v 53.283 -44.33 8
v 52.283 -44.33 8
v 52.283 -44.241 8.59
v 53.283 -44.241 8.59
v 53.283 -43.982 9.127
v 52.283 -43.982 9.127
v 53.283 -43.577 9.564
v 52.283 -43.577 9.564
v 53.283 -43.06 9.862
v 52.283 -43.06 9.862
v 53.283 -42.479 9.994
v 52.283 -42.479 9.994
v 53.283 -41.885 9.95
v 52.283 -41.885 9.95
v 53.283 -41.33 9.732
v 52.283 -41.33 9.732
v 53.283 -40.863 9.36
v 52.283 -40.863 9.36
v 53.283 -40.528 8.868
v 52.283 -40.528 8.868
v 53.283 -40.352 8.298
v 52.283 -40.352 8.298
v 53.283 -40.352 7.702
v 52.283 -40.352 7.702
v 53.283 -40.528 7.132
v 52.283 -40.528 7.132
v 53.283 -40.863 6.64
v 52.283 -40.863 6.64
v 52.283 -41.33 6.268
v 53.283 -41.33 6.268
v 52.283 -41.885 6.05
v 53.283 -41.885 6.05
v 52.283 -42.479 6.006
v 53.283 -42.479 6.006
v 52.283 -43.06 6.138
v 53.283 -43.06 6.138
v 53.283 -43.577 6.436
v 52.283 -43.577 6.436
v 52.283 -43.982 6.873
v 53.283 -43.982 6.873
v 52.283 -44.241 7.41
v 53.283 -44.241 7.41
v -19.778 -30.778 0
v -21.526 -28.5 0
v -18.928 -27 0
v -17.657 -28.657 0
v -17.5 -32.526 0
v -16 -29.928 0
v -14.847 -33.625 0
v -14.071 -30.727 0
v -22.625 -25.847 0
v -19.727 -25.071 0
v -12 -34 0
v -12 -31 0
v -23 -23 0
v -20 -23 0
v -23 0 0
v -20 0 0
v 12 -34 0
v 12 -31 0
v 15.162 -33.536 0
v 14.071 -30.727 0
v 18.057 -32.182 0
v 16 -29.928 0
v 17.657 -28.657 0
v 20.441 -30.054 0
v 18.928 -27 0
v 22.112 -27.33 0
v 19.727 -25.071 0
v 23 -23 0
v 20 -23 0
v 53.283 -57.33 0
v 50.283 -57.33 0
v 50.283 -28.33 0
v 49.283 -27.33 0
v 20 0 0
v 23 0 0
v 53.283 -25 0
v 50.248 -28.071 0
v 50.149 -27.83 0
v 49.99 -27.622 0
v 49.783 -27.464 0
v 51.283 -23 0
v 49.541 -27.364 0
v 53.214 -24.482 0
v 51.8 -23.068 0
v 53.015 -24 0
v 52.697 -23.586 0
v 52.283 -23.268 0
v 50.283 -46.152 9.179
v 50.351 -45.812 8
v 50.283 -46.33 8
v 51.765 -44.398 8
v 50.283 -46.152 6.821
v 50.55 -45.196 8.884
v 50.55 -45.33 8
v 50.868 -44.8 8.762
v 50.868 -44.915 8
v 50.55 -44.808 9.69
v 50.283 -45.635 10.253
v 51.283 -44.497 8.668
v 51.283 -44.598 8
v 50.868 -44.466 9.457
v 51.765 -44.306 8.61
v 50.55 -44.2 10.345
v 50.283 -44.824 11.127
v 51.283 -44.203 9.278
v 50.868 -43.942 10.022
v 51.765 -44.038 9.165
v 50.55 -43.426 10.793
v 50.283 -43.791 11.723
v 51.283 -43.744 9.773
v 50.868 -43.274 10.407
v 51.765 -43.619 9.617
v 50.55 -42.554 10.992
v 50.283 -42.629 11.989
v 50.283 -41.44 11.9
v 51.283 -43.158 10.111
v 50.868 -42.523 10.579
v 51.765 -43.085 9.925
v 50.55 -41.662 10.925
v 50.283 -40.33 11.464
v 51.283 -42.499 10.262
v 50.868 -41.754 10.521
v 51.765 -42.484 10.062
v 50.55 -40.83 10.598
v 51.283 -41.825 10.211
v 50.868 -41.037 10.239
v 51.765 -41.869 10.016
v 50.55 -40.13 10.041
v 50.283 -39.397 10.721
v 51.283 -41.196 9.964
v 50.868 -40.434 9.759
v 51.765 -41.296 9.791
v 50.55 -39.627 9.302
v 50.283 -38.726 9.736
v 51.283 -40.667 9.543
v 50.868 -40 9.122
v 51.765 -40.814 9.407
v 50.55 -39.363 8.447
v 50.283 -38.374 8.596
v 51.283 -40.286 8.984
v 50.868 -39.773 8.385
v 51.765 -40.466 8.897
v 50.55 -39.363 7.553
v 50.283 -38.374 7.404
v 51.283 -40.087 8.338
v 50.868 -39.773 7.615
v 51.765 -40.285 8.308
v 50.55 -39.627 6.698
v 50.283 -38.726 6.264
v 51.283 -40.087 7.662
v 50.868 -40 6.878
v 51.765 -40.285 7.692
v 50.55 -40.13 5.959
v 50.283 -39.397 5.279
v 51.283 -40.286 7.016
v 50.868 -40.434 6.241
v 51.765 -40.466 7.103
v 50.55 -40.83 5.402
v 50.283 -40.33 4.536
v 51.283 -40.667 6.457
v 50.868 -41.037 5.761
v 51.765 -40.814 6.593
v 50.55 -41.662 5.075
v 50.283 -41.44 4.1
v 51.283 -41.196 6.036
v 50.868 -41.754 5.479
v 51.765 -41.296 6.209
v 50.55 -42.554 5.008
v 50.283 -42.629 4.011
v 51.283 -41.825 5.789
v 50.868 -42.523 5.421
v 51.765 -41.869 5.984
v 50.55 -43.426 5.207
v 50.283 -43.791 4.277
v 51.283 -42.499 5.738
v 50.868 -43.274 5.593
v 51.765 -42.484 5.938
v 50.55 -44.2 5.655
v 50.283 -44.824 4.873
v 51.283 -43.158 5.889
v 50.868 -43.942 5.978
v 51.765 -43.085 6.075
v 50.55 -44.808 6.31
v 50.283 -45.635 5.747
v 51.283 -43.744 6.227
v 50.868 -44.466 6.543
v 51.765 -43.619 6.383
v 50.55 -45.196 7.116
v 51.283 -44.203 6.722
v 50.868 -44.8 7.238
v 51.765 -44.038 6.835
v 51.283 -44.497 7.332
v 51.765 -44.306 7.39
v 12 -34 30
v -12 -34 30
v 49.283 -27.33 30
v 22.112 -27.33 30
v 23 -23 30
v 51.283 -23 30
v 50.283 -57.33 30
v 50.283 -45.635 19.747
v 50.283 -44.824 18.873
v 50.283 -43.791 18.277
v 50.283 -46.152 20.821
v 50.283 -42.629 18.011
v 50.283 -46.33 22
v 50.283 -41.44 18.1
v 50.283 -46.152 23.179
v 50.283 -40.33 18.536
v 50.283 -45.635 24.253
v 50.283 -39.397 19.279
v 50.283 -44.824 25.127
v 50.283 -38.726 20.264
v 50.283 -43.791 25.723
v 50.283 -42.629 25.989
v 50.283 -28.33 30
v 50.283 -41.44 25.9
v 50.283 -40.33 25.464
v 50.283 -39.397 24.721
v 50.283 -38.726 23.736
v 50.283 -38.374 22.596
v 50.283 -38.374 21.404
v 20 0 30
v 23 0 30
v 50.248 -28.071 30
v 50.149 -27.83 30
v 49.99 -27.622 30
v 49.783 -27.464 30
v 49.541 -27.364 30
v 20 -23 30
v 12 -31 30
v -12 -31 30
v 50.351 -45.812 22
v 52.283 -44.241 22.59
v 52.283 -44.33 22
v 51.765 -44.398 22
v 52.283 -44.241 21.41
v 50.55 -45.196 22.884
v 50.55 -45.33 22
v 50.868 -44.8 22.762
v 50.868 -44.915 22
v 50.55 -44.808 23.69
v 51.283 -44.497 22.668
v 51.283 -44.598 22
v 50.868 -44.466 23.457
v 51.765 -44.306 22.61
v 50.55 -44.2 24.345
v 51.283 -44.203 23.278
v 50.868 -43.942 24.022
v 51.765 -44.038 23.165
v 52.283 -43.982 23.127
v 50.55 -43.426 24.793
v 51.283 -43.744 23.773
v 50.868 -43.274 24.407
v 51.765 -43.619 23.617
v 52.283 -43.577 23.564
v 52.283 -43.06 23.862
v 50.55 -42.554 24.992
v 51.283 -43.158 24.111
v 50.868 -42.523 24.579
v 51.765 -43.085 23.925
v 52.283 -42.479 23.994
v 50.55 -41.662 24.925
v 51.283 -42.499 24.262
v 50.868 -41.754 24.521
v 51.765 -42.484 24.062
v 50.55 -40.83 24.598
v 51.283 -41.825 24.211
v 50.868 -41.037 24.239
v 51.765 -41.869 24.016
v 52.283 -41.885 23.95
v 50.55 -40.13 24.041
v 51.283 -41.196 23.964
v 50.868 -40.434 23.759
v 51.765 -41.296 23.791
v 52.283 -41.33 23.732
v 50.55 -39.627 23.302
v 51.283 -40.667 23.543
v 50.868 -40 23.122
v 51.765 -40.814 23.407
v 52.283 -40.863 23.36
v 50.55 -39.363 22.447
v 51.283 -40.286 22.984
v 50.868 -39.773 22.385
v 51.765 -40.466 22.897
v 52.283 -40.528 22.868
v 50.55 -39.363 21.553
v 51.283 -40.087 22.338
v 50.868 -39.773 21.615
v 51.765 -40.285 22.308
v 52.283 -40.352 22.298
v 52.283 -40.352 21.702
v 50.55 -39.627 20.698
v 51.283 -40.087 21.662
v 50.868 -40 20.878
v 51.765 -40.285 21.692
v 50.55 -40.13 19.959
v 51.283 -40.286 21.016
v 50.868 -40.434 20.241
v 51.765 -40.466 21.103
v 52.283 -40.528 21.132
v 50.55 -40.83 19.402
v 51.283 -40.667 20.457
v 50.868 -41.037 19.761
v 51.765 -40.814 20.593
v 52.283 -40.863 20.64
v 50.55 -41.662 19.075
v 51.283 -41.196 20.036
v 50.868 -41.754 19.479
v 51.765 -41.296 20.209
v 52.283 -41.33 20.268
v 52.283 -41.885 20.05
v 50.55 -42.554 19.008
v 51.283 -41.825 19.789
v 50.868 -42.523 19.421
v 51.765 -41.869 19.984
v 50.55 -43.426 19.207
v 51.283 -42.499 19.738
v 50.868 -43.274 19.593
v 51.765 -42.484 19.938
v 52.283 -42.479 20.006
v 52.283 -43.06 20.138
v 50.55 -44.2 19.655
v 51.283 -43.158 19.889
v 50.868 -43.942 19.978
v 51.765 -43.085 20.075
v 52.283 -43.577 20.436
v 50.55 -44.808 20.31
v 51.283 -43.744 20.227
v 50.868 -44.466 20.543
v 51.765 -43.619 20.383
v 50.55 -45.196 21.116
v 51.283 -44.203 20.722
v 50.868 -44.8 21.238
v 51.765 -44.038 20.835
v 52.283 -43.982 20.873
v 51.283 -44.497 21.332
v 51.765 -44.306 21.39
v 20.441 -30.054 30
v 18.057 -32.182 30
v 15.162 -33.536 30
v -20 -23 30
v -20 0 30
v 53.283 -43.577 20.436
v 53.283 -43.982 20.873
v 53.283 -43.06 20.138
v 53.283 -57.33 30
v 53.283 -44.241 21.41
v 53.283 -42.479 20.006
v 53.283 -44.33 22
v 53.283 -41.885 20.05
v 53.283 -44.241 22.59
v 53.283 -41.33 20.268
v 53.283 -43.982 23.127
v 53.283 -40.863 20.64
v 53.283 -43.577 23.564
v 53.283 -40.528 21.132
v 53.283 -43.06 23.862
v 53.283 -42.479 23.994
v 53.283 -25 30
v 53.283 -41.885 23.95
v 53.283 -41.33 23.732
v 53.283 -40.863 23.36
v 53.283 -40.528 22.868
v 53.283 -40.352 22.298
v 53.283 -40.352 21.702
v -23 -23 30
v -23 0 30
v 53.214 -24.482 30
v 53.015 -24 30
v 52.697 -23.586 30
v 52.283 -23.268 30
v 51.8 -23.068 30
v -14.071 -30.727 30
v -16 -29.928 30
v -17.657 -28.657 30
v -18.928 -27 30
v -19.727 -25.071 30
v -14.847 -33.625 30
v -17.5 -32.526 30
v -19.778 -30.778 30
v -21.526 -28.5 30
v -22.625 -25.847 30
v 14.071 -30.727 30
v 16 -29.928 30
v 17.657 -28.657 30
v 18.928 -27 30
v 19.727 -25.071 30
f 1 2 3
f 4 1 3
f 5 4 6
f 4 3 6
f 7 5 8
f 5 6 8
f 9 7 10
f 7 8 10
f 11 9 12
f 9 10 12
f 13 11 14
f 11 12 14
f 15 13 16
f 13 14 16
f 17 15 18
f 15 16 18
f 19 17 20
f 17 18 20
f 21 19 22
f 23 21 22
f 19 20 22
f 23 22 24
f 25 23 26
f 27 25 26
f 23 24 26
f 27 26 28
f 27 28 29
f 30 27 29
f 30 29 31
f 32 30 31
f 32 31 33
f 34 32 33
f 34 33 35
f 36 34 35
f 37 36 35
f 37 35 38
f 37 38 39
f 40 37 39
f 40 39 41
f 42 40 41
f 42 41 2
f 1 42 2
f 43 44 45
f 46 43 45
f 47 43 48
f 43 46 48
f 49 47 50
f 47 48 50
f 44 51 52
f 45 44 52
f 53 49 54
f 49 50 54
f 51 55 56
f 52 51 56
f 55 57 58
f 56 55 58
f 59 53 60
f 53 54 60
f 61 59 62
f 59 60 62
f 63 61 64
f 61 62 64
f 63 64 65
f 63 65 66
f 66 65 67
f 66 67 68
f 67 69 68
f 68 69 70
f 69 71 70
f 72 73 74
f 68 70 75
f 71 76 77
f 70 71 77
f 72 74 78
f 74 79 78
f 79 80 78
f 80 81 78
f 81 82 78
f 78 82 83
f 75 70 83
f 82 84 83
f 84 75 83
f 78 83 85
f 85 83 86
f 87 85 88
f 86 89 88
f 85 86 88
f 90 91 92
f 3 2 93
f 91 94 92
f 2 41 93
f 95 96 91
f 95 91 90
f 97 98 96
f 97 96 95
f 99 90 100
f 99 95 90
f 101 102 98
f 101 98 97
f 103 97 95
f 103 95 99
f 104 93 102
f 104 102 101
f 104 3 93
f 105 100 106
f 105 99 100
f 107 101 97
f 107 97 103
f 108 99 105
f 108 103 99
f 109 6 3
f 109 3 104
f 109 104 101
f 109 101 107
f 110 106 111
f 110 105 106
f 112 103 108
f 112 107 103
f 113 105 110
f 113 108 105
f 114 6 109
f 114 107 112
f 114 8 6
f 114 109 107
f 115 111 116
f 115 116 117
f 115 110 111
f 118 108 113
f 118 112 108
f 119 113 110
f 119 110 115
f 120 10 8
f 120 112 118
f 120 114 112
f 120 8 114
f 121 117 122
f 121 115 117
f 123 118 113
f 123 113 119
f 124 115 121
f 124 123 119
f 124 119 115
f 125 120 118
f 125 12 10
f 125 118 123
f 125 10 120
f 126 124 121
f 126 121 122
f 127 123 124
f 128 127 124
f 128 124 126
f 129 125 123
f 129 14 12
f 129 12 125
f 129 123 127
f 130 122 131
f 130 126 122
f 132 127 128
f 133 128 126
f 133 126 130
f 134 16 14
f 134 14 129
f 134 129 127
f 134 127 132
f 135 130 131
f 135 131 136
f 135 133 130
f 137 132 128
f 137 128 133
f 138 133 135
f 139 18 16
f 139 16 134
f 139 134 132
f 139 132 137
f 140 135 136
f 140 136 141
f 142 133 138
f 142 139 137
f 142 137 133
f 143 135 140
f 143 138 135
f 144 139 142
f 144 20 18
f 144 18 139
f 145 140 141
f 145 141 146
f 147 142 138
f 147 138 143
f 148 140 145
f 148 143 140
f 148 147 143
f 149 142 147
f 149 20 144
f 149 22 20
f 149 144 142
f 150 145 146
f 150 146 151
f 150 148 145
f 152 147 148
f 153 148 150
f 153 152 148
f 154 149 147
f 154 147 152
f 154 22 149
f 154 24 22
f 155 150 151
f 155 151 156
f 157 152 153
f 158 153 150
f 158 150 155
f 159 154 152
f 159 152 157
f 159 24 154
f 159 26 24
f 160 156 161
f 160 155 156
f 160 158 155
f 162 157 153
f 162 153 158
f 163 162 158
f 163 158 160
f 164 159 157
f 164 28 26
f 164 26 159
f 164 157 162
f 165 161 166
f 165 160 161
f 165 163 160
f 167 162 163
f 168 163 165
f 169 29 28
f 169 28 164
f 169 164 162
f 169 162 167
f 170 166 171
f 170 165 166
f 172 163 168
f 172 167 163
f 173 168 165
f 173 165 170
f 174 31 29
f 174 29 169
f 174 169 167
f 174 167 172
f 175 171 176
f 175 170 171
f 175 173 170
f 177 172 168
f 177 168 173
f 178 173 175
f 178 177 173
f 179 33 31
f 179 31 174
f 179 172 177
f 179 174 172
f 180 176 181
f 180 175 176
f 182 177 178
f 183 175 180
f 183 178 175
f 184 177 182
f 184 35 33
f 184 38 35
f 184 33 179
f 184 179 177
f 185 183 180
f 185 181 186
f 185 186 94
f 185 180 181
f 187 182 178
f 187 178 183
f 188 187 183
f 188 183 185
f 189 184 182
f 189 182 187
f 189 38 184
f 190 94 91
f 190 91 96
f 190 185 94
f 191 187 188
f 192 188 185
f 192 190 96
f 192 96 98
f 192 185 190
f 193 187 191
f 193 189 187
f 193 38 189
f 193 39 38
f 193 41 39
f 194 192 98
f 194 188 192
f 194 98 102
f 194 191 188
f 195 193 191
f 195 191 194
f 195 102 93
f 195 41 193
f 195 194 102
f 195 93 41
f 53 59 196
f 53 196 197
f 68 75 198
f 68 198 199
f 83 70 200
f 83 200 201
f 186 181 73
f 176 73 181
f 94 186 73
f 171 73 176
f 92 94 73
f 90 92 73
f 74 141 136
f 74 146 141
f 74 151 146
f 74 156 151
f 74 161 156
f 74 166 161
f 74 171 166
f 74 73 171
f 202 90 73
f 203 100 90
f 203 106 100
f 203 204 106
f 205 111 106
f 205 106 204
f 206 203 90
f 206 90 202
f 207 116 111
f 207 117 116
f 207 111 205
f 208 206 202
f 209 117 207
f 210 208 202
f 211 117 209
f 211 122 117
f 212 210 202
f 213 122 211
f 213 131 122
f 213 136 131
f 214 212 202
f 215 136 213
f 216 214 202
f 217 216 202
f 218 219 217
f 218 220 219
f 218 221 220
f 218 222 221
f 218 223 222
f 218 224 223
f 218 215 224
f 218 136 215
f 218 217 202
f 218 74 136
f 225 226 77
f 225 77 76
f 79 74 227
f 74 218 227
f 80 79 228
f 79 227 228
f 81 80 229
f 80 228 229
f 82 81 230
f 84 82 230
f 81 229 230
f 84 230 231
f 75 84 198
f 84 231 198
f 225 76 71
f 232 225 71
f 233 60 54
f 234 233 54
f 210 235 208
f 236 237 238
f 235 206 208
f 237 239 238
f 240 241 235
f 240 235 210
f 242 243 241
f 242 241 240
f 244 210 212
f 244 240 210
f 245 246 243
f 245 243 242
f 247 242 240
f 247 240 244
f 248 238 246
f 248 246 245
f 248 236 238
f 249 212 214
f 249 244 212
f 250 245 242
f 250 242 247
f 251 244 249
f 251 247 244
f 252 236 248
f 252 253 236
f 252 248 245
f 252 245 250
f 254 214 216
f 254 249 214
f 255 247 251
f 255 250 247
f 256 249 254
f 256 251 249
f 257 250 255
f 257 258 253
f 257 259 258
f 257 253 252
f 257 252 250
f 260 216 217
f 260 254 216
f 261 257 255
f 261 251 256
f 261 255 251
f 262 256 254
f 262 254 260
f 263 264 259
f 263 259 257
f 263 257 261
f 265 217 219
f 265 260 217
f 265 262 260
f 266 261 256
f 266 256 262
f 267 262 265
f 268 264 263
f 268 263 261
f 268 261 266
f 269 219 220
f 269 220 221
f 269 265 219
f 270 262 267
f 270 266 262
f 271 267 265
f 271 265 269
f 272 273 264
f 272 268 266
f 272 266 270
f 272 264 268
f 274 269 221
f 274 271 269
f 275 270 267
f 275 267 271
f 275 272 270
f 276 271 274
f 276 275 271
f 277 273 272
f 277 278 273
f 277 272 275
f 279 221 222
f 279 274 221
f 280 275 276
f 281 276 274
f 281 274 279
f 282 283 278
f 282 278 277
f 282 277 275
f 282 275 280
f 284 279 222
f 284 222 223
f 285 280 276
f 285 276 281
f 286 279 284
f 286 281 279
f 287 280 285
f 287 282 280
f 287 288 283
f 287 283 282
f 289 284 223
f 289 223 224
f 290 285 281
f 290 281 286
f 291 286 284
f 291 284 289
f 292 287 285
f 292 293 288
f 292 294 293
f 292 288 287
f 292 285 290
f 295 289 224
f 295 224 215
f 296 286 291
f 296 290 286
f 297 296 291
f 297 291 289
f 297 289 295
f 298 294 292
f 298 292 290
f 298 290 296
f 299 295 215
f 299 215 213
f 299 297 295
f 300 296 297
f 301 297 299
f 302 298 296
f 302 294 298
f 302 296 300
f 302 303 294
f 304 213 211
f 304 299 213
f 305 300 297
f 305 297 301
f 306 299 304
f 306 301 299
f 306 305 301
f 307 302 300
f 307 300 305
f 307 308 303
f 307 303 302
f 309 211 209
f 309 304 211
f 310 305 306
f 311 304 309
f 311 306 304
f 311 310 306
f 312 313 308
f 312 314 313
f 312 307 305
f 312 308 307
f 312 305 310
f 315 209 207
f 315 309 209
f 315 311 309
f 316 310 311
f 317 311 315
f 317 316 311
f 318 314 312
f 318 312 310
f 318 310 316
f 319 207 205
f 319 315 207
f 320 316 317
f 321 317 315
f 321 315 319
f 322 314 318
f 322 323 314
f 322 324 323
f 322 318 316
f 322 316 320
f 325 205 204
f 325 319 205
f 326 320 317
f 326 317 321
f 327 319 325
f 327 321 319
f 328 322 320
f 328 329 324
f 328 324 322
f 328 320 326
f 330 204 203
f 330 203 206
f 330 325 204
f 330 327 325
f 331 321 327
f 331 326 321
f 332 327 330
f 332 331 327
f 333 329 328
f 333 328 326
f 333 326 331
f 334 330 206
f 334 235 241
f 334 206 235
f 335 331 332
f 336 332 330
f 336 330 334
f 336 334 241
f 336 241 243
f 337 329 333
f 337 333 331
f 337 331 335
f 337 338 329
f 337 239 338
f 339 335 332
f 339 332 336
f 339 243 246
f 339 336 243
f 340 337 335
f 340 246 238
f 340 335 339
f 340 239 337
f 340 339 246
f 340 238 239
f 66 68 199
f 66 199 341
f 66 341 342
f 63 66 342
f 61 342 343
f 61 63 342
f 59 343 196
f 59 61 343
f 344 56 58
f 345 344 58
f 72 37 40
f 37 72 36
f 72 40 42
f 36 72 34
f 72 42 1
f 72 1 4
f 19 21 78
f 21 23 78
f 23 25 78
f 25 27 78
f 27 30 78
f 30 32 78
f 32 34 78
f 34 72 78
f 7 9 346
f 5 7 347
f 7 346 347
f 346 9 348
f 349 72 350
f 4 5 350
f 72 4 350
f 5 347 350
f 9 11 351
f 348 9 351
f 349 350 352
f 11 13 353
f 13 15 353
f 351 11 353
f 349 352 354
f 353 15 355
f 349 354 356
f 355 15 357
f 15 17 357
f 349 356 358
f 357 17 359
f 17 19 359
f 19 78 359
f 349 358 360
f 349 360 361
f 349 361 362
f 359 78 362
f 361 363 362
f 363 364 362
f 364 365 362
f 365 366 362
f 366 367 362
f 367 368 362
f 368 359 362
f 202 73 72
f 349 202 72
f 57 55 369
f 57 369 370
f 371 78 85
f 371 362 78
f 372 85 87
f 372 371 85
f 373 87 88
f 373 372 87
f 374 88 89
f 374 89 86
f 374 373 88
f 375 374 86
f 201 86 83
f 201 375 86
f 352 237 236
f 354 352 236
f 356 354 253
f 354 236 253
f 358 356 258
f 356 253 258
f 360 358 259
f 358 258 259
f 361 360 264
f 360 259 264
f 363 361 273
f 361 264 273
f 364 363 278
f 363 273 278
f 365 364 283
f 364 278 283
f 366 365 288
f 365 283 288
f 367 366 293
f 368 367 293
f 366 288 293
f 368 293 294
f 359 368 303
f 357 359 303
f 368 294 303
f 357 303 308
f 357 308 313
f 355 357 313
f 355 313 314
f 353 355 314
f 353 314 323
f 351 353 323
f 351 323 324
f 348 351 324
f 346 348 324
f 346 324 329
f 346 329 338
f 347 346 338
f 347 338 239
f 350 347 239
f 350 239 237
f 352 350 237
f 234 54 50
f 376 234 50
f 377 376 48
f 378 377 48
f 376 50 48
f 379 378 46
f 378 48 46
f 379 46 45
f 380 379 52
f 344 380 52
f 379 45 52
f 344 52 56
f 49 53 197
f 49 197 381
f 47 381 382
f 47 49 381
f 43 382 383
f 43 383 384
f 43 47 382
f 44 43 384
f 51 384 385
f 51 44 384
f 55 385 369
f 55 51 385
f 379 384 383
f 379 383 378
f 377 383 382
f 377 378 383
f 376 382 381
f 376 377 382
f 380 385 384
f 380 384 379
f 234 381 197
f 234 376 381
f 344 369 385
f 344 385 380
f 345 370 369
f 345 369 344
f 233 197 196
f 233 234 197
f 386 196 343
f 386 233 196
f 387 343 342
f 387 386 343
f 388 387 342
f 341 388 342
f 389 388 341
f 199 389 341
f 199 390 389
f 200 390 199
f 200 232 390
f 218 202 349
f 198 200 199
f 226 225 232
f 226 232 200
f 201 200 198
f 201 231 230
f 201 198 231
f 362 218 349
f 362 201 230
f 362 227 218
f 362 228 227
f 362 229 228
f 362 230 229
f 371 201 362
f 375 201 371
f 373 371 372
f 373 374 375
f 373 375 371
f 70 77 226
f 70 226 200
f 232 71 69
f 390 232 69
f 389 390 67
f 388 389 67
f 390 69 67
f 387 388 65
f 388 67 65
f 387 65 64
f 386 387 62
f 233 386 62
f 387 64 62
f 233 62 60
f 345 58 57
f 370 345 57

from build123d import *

# Parameters (mm, degrees)
BOSS_EXTRUDE1_DEPTH = 30
BOSS_EXTRUDE2_DEPTH = 30
SKETCH3_W           = 3
SKETCH3_H           = 30
BOSS_EXTRUDE3_DEPTH = 30
FILLET1_R           = 1
FILLET2_R           = 2
SKETCH4_R           = 2
CUT_EXTRUDE1_DEPTH  = 30
FILLET3_R           = 2
SKETCH6_W           = 80.718838425
SKETCH6_H           = 35.980410733
CUT_EXTRUDE2_DEPTH  = 84.819501439


with BuildPart() as part:
    # Sketch1 → Boss-Extrude1 (new body)
    with BuildSketch(Plane.XY):
        with BuildLine():
            Line((-12, 34), (12, 34))
            ThreePointArc((12, 34), (19.778174593, 30.778174593), (23, 23))
            Line((23, 23), (23, -23))
            ThreePointArc((23, -23), (19.778174593, -30.778174593), (12, -34))
            Line((12, -34), (-12, -34))
            ThreePointArc((-12, -34), (-19.778174593, -30.778174593), (-23, -23))
            Line((-23, -23), (-23, 23))
            ThreePointArc((-23, 23), (-19.778174593, 30.778174593), (-12, 34))
        make_face()
        with BuildLine():
            Line((-12, 31), (12, 31))
            ThreePointArc((12, 31), (17.656854249, 28.656854249), (20, 23))
            Line((20, 23), (20, -23))
            ThreePointArc((20, -23), (17.656854249, -28.656854249), (12, -31))
            Line((12, -31), (-12, -31))
            ThreePointArc((-12, -31), (-17.656854249, -28.656854249), (-20, -23))
            Line((-20, -23), (-20, 23))
            ThreePointArc((-20, 23), (-17.656854249, 28.656854249), (-12, 31))
        make_face(mode=Mode.SUBTRACT)
    extrude(amount=BOSS_EXTRUDE1_DEPTH)

    # Sketch2 → Boss-Extrude2 (add)
    with BuildSketch(Plane.XY):
        with BuildLine():
            Line((23, -23), (53.282521301, -23))
            Line((53.282521301, -23), (53.282521301, -27.329588742))
            Line((53.282521301, -27.329588742), (22.112104693, -27.329588742))
            ThreePointArc((22.112104693, -27.329588742), (22.775740151, -25.209847096), (23, -23))
        make_face()
    extrude(amount=BOSS_EXTRUDE2_DEPTH)

    # Sketch3 → Boss-Extrude3 (add)
    with BuildSketch(Plane.XZ.offset(27.329588742)):
        with Locations((51.782521301, 15)):
            Rectangle(SKETCH3_W, SKETCH3_H)
    extrude(amount=BOSS_EXTRUDE3_DEPTH)

    # Fillet1
    fillet1_edges = [part.edges().sort_by_distance(p)[0] for p in [
        (50.282521301, -27.329588742, 15),
    ]]
    fillet(fillet1_edges, radius=FILLET1_R)

    # Fillet2
    fillet2_edges = [part.edges().sort_by_distance(p)[0] for p in [
        (53.282521301, -23, 15),
    ]]
    fillet(fillet2_edges, radius=FILLET2_R)

    # Sketch4 → Cut-Extrude1 (cut)
    with BuildSketch(Plane.ZY.offset(-50.282521301)):
        with Locations(Location((22, -42.329588742, 0), (0, 0, 270))):
            Circle(SKETCH4_R)
        with Locations(Location((8, -42.329588742, 0), (0, 0, 270))):
            Circle(SKETCH4_R)
    extrude(amount=-CUT_EXTRUDE1_DEPTH, mode=Mode.SUBTRACT)

    # Fillet3
    fillet3_edges = [part.edges().sort_by_distance(p)[0] for p in [
        (50.282521301, -40.329588742, 22),
        (50.282521301, -40.329588742, 8),
    ]]
    fillet(fillet3_edges, radius=FILLET3_R)

    # Sketch6 → Cut-Extrude2 (cut, through all)
    with BuildSketch(Plane(origin=(0, 0, 0), x_dir=(-1, 0, 0), z_dir=(0, 0, -1))):
        with Locations((3.744263304, 17.990205366)):
            Rectangle(SKETCH6_W, SKETCH6_H)
    extrude(amount=-CUT_EXTRUDE2_DEPTH, mode=Mode.SUBTRACT)


solid = part.part
